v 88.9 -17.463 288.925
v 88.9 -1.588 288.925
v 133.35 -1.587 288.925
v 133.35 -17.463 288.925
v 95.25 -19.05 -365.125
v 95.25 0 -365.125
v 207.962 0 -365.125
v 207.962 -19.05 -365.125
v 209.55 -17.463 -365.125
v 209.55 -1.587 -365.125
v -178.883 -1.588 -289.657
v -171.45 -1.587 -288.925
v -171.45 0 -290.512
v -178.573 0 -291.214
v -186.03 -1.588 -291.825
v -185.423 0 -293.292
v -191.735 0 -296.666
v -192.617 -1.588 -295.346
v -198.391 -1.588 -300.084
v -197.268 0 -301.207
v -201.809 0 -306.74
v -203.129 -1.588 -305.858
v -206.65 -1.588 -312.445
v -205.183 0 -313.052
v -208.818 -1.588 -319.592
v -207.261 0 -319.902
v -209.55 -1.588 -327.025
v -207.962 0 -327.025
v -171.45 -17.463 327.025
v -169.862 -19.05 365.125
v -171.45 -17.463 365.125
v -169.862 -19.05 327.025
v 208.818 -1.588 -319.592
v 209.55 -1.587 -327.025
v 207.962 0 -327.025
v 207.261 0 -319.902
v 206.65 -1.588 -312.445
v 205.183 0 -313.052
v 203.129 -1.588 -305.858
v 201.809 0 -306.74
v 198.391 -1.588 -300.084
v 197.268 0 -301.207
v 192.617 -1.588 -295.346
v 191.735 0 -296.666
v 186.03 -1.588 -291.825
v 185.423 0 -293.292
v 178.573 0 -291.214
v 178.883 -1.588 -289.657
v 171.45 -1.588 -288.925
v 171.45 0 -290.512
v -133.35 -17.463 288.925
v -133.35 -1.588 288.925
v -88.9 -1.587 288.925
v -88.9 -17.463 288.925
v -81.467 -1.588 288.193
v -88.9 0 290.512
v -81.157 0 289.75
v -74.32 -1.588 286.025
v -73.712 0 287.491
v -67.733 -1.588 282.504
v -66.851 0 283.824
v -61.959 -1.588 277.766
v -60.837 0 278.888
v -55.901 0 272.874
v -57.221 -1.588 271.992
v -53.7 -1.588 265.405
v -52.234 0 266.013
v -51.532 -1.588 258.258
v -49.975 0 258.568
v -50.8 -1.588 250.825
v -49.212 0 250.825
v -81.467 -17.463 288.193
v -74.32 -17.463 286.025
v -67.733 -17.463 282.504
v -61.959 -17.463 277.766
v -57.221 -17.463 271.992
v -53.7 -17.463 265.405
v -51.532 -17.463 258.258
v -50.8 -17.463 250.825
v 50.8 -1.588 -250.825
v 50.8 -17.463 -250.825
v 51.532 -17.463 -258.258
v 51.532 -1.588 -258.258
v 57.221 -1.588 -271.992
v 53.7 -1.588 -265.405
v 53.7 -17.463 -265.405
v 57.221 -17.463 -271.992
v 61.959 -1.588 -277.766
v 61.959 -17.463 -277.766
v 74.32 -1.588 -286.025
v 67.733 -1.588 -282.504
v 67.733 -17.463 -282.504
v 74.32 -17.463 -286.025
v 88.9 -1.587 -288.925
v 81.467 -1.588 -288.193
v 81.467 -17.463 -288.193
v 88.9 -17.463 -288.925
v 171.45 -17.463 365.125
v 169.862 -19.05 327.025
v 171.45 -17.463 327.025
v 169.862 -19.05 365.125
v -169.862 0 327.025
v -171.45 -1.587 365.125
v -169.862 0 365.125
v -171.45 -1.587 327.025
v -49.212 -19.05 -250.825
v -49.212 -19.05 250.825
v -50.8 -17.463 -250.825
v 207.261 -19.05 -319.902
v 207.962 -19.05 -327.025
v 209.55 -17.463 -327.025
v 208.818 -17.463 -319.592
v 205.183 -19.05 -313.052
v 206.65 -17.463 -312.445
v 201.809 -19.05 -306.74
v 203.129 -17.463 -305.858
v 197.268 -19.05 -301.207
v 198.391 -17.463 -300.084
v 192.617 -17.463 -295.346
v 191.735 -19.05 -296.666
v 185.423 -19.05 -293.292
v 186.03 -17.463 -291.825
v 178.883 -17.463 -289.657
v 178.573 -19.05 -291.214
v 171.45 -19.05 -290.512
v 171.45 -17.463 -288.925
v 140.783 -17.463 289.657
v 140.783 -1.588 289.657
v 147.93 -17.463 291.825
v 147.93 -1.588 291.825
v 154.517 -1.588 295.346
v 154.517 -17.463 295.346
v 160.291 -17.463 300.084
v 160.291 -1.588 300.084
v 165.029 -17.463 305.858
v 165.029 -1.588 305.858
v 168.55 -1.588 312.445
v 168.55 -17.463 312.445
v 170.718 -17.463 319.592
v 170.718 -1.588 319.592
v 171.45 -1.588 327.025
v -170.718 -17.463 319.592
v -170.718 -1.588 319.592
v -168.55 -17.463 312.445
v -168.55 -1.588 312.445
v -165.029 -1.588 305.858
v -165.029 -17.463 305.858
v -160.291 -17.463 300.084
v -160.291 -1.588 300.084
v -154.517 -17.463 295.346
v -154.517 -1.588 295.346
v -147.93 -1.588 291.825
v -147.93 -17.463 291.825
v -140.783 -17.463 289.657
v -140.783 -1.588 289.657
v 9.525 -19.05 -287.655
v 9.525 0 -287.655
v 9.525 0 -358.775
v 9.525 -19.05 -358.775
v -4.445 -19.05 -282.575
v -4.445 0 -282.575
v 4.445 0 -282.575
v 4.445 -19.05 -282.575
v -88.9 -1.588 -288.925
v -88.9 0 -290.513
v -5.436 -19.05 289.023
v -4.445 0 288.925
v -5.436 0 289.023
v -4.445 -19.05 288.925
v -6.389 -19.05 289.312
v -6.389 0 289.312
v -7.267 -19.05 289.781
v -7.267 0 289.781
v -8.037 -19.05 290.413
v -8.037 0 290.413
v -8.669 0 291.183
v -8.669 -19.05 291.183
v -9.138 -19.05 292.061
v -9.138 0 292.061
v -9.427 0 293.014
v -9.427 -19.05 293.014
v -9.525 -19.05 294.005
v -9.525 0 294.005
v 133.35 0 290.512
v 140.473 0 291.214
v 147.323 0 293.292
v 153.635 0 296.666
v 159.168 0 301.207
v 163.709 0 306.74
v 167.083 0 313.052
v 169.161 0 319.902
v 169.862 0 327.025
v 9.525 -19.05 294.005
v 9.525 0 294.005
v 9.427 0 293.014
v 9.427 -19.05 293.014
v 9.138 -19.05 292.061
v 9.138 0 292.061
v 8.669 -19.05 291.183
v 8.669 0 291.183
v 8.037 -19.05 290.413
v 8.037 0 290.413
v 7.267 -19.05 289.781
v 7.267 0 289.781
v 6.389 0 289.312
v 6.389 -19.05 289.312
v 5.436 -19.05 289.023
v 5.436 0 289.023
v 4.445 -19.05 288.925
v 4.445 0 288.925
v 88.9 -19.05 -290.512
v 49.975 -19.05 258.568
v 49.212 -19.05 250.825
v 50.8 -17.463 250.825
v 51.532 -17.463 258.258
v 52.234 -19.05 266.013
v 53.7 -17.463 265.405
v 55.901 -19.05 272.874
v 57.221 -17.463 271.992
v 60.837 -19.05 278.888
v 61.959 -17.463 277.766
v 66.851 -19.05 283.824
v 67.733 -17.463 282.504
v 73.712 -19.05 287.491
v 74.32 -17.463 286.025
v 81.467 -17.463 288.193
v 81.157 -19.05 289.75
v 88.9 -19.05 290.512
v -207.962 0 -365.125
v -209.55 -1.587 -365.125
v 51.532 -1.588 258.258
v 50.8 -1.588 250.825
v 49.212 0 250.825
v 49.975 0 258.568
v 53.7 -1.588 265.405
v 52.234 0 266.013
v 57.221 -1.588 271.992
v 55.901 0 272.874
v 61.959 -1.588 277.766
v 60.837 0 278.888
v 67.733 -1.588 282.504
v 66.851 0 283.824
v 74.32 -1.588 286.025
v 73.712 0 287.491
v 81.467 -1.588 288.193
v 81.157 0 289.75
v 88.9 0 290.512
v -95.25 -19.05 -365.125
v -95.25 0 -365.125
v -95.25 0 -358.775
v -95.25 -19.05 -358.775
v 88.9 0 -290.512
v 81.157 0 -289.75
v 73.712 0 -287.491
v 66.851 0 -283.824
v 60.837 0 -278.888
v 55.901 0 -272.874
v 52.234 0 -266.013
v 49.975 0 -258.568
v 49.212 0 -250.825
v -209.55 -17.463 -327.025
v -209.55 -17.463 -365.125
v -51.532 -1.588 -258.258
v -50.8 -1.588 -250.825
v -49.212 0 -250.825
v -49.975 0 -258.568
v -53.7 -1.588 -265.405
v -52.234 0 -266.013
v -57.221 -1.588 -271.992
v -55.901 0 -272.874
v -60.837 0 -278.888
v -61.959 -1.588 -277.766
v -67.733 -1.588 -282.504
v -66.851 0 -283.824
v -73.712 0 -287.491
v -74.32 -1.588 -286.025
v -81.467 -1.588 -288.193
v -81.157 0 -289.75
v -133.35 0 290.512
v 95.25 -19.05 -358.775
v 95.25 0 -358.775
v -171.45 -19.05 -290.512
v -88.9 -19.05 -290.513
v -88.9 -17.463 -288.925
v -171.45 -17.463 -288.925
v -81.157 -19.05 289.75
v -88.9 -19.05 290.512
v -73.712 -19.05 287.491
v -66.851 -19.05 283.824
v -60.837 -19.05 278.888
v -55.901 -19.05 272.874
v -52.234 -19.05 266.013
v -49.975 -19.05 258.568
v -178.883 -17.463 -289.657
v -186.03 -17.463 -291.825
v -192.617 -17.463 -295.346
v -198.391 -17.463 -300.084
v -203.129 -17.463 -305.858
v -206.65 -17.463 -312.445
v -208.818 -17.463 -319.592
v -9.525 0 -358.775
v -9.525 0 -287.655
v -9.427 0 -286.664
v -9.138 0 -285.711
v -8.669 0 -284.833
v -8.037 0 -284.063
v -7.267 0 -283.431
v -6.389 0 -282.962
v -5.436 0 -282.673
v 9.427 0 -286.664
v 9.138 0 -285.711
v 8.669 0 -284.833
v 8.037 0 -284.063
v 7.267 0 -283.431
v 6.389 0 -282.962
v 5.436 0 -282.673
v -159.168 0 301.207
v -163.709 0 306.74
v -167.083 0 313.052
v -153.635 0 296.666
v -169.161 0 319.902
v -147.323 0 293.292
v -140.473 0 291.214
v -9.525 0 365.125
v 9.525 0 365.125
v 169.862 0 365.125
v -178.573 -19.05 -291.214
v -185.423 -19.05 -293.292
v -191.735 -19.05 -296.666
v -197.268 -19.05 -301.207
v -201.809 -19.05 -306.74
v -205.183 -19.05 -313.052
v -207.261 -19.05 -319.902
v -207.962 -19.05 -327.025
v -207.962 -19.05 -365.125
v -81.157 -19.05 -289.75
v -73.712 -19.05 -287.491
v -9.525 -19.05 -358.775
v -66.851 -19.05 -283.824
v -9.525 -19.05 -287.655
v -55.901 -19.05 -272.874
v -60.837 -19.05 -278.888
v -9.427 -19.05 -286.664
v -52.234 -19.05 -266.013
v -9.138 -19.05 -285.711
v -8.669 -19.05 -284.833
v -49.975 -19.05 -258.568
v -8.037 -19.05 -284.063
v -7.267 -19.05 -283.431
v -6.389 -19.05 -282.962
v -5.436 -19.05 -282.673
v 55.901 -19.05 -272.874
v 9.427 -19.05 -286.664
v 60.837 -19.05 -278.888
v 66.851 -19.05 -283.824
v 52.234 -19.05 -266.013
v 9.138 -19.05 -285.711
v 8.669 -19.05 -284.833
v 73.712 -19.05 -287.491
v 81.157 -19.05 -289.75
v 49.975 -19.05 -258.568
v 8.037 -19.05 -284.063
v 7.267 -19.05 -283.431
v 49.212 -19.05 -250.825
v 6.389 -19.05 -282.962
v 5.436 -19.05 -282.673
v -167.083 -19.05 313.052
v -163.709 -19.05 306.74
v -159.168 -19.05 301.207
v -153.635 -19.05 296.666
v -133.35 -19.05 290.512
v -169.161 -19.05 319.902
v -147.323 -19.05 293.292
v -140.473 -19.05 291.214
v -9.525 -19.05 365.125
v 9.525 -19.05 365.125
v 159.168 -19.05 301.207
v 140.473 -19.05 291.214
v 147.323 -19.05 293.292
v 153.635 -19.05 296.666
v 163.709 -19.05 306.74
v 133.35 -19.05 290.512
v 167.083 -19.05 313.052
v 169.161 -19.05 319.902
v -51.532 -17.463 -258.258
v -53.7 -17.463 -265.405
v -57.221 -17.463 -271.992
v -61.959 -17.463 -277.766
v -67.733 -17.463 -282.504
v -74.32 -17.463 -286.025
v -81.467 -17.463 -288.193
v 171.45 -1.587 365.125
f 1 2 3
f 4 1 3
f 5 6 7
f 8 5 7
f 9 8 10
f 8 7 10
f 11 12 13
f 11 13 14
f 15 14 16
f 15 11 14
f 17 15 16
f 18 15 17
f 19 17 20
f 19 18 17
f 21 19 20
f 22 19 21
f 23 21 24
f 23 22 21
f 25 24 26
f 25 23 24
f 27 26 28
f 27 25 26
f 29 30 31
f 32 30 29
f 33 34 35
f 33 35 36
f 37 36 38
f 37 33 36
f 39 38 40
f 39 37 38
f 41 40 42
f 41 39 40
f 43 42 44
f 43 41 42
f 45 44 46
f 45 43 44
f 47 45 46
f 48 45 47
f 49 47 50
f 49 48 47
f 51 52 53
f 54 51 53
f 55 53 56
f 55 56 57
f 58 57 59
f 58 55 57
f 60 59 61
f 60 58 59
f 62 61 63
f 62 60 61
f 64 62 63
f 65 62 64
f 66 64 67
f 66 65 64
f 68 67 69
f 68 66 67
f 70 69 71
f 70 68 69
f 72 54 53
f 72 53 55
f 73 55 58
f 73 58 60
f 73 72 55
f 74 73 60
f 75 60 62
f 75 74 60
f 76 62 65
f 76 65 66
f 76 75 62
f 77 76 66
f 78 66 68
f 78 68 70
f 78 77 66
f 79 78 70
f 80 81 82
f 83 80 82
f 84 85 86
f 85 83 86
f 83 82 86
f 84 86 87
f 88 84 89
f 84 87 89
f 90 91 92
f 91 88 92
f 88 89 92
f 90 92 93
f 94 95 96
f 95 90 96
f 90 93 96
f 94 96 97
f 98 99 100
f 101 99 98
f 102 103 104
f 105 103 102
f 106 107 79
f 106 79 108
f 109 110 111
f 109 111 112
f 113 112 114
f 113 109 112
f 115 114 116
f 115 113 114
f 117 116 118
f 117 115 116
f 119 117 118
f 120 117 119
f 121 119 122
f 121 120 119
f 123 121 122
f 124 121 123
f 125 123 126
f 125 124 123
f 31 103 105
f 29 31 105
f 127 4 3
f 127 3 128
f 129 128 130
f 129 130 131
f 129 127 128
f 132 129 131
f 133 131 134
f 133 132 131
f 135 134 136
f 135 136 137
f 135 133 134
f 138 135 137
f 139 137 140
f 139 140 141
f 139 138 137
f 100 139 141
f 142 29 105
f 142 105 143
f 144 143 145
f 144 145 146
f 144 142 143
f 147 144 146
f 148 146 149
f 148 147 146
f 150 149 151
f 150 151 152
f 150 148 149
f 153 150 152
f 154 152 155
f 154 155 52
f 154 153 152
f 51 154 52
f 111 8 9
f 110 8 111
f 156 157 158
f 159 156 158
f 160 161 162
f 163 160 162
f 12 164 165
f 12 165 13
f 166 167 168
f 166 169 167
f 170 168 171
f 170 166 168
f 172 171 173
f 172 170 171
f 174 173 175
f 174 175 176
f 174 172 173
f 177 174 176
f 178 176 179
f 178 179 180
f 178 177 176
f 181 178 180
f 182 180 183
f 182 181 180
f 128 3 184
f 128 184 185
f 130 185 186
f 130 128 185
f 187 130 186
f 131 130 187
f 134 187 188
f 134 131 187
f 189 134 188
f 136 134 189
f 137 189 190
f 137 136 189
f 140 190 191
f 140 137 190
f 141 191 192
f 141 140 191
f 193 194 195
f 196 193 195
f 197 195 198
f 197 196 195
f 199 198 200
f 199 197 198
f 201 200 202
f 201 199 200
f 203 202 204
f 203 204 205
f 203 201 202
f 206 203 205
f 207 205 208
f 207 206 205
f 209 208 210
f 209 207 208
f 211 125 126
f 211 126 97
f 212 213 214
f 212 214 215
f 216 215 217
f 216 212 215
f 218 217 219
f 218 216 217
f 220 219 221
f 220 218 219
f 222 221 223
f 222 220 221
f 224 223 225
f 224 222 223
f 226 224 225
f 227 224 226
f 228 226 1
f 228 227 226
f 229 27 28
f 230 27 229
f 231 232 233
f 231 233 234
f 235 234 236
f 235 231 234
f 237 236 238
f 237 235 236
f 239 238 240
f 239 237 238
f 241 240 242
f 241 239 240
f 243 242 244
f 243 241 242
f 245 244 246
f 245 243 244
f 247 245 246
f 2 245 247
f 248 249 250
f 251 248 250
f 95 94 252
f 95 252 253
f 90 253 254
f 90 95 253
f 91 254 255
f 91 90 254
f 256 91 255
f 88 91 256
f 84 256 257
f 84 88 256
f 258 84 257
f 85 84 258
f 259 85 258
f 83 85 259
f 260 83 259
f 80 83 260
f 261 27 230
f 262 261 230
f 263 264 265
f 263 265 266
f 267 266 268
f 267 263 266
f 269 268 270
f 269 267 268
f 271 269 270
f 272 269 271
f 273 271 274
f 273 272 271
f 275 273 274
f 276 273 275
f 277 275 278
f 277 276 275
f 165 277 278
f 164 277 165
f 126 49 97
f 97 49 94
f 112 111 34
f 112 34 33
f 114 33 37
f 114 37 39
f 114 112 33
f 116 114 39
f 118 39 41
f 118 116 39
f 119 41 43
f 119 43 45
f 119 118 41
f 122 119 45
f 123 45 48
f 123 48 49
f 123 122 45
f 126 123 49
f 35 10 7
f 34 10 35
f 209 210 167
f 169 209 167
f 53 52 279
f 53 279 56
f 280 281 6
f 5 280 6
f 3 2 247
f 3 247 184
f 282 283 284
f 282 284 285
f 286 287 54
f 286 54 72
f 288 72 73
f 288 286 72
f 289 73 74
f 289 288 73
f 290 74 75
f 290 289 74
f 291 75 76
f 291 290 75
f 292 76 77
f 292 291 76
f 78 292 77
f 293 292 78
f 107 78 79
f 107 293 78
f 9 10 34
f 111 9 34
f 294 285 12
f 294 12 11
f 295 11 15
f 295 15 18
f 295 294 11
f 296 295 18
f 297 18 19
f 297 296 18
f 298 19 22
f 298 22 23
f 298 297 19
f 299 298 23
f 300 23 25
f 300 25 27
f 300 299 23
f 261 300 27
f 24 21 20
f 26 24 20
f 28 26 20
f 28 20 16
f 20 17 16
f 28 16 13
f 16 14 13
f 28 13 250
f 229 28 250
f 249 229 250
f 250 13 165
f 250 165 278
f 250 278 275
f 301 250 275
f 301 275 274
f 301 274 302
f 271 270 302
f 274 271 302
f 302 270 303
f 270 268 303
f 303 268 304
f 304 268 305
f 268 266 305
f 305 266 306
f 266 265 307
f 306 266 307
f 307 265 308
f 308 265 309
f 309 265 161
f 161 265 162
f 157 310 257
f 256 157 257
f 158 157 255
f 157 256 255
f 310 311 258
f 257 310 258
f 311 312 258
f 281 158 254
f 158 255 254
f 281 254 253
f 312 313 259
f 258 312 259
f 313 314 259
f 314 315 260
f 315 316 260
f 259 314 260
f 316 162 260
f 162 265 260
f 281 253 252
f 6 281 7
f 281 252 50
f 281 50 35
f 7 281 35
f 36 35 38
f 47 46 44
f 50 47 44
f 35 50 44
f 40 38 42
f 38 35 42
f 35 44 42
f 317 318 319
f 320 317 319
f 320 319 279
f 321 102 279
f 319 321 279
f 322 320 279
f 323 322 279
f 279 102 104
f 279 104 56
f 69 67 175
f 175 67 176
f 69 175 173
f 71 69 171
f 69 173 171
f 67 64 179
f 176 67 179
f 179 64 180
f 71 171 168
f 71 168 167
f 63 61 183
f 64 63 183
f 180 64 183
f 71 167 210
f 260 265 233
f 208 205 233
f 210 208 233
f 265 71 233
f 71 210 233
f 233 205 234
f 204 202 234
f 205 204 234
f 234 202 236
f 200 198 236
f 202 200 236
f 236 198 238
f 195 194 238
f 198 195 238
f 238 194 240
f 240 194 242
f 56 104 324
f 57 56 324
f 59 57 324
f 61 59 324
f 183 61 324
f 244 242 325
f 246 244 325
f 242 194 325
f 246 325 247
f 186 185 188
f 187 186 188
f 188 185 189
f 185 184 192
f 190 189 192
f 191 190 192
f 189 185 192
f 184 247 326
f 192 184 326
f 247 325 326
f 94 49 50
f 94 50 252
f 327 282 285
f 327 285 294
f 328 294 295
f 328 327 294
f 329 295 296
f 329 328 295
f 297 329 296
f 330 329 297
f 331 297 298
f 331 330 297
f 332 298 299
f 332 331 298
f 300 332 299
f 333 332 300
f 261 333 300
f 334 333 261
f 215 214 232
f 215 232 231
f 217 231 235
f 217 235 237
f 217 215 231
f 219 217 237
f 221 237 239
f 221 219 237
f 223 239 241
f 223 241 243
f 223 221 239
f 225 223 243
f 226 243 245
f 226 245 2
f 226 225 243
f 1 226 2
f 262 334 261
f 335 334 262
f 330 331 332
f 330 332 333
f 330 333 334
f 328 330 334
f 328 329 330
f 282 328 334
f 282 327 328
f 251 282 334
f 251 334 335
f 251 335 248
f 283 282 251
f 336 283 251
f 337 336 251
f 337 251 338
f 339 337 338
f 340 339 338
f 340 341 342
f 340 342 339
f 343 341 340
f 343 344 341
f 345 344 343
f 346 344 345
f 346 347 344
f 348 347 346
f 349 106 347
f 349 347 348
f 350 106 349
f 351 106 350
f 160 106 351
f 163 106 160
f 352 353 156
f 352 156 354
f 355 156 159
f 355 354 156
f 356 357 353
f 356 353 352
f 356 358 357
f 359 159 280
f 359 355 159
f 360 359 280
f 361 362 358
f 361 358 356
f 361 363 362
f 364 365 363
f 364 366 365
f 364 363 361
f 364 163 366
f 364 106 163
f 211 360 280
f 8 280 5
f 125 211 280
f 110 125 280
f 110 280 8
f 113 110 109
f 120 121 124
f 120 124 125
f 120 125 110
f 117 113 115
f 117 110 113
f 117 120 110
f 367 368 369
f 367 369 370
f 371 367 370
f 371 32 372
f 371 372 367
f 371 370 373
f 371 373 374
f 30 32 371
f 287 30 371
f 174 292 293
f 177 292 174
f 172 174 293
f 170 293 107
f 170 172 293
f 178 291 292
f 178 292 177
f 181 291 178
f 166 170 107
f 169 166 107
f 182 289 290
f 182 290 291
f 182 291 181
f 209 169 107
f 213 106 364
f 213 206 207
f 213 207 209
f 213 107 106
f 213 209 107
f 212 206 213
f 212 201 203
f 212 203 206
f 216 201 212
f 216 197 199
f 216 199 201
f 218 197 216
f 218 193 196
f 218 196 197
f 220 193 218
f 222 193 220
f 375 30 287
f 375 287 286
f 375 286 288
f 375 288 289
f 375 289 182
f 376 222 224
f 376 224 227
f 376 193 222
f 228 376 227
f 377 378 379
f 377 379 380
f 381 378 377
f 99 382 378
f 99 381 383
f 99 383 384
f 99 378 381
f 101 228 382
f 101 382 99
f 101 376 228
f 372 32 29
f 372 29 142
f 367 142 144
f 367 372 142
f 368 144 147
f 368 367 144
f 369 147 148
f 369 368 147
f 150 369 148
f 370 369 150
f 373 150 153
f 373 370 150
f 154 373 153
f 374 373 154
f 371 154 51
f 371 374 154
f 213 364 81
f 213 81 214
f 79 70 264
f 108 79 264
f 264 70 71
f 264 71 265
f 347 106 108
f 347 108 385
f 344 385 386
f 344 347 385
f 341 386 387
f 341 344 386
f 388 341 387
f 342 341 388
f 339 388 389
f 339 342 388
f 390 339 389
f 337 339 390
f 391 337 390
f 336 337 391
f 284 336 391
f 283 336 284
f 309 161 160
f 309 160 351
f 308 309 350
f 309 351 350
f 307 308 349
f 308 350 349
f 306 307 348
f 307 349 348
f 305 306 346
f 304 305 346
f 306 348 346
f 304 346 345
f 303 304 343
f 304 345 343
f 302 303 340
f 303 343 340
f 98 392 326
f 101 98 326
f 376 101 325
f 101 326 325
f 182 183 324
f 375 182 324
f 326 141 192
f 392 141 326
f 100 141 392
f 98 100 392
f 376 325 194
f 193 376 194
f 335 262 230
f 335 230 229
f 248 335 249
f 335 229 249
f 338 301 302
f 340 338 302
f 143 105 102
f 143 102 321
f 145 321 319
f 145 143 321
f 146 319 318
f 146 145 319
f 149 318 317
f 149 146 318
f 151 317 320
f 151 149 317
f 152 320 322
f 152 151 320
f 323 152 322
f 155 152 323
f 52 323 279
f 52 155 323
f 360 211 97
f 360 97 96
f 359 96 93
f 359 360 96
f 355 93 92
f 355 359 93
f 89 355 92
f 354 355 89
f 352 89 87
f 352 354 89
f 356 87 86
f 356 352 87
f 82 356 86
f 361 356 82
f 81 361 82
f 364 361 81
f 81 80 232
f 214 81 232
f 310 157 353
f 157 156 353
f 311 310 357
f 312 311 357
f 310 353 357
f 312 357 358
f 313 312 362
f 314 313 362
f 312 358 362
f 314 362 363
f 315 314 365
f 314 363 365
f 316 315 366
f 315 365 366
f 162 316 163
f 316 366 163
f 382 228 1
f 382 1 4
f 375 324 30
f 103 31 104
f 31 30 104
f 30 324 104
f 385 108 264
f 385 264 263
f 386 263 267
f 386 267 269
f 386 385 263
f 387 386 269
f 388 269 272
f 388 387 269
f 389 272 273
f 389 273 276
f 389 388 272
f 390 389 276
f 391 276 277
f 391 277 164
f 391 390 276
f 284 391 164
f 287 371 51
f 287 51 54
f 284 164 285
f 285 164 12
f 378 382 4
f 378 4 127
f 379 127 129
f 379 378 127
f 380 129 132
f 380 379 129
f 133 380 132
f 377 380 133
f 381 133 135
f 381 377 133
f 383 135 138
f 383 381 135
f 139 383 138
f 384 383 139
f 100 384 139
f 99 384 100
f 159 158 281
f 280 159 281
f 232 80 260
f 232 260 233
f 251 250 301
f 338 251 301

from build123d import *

# Parameters (mm, degrees)
F1_DEPTH = 19.05
F2_R     = 38.1
F3_R     = 5.08
F4_R     = 5.08
F5_SIZE  = 1.5875


with BuildPart() as f1:
    # F0 (on Front) → F1 (new body)
    with BuildSketch(Plane.XZ):
        Polygon((50.8, -288.925), (50.8, 288.925), (171.45, 288.925), (171.45, 365.125), (9.525, 365.125), (9.525, 288.925), (-9.525, 288.925), (-9.525, 365.125), (-171.45, 365.125), (-171.45, 288.925), (-50.8, 288.925), (-50.8, -288.925), (-209.55, -288.925), (-209.55, -365.125), (-95.25, -365.125), (-95.25, -358.775), (-9.525, -358.775), (-9.525, -282.575), (9.525, -282.575), (9.525, -358.775), (95.25, -358.775), (95.25, -365.125), (209.55, -365.125), (209.55, -288.925), align=None)
    extrude(amount=F1_DEPTH)

    # F2
    f2_edges = [f1.edges().sort_by_distance(p)[0] for p in [
        (50.8, -9.525, 288.925),
        (-50.8, -9.525, 288.925),
        (171.45, -9.525, 288.925),
        (-171.45, -9.525, 288.925),
        (-209.55, -9.525, -288.925),
        (50.8, -9.525, -288.925),
        (209.55, -9.525, -288.925),
        (-50.8, -9.525, -288.925),
    ]]
    fillet(f2_edges, radius=F2_R)

    # F3
    f3_edges = [f1.edges().sort_by_distance(p)[0] for p in [
        (9.525, -9.525, 288.925),
        (-9.525, -9.525, 288.925),
    ]]
    fillet(f3_edges, radius=F3_R)

    # F4
    f4_edges = [f1.edges().sort_by_distance(p)[0] for p in [
        (9.525, -9.525, -282.575),
        (-9.525, -9.525, -282.575),
    ]]
    fillet(f4_edges, radius=F4_R)

    # F5
    f5_edges = [f1.edges().sort_by_distance(p)[0] for p in [
        (-50.8, -19.05, 0),
        (-50.8, 0, 0),
        (50.8, -19.05, 0),
        (50.8, 0, 0),
    ]]
    chamfer(f5_edges, length=F5_SIZE)


solid = f1.part
